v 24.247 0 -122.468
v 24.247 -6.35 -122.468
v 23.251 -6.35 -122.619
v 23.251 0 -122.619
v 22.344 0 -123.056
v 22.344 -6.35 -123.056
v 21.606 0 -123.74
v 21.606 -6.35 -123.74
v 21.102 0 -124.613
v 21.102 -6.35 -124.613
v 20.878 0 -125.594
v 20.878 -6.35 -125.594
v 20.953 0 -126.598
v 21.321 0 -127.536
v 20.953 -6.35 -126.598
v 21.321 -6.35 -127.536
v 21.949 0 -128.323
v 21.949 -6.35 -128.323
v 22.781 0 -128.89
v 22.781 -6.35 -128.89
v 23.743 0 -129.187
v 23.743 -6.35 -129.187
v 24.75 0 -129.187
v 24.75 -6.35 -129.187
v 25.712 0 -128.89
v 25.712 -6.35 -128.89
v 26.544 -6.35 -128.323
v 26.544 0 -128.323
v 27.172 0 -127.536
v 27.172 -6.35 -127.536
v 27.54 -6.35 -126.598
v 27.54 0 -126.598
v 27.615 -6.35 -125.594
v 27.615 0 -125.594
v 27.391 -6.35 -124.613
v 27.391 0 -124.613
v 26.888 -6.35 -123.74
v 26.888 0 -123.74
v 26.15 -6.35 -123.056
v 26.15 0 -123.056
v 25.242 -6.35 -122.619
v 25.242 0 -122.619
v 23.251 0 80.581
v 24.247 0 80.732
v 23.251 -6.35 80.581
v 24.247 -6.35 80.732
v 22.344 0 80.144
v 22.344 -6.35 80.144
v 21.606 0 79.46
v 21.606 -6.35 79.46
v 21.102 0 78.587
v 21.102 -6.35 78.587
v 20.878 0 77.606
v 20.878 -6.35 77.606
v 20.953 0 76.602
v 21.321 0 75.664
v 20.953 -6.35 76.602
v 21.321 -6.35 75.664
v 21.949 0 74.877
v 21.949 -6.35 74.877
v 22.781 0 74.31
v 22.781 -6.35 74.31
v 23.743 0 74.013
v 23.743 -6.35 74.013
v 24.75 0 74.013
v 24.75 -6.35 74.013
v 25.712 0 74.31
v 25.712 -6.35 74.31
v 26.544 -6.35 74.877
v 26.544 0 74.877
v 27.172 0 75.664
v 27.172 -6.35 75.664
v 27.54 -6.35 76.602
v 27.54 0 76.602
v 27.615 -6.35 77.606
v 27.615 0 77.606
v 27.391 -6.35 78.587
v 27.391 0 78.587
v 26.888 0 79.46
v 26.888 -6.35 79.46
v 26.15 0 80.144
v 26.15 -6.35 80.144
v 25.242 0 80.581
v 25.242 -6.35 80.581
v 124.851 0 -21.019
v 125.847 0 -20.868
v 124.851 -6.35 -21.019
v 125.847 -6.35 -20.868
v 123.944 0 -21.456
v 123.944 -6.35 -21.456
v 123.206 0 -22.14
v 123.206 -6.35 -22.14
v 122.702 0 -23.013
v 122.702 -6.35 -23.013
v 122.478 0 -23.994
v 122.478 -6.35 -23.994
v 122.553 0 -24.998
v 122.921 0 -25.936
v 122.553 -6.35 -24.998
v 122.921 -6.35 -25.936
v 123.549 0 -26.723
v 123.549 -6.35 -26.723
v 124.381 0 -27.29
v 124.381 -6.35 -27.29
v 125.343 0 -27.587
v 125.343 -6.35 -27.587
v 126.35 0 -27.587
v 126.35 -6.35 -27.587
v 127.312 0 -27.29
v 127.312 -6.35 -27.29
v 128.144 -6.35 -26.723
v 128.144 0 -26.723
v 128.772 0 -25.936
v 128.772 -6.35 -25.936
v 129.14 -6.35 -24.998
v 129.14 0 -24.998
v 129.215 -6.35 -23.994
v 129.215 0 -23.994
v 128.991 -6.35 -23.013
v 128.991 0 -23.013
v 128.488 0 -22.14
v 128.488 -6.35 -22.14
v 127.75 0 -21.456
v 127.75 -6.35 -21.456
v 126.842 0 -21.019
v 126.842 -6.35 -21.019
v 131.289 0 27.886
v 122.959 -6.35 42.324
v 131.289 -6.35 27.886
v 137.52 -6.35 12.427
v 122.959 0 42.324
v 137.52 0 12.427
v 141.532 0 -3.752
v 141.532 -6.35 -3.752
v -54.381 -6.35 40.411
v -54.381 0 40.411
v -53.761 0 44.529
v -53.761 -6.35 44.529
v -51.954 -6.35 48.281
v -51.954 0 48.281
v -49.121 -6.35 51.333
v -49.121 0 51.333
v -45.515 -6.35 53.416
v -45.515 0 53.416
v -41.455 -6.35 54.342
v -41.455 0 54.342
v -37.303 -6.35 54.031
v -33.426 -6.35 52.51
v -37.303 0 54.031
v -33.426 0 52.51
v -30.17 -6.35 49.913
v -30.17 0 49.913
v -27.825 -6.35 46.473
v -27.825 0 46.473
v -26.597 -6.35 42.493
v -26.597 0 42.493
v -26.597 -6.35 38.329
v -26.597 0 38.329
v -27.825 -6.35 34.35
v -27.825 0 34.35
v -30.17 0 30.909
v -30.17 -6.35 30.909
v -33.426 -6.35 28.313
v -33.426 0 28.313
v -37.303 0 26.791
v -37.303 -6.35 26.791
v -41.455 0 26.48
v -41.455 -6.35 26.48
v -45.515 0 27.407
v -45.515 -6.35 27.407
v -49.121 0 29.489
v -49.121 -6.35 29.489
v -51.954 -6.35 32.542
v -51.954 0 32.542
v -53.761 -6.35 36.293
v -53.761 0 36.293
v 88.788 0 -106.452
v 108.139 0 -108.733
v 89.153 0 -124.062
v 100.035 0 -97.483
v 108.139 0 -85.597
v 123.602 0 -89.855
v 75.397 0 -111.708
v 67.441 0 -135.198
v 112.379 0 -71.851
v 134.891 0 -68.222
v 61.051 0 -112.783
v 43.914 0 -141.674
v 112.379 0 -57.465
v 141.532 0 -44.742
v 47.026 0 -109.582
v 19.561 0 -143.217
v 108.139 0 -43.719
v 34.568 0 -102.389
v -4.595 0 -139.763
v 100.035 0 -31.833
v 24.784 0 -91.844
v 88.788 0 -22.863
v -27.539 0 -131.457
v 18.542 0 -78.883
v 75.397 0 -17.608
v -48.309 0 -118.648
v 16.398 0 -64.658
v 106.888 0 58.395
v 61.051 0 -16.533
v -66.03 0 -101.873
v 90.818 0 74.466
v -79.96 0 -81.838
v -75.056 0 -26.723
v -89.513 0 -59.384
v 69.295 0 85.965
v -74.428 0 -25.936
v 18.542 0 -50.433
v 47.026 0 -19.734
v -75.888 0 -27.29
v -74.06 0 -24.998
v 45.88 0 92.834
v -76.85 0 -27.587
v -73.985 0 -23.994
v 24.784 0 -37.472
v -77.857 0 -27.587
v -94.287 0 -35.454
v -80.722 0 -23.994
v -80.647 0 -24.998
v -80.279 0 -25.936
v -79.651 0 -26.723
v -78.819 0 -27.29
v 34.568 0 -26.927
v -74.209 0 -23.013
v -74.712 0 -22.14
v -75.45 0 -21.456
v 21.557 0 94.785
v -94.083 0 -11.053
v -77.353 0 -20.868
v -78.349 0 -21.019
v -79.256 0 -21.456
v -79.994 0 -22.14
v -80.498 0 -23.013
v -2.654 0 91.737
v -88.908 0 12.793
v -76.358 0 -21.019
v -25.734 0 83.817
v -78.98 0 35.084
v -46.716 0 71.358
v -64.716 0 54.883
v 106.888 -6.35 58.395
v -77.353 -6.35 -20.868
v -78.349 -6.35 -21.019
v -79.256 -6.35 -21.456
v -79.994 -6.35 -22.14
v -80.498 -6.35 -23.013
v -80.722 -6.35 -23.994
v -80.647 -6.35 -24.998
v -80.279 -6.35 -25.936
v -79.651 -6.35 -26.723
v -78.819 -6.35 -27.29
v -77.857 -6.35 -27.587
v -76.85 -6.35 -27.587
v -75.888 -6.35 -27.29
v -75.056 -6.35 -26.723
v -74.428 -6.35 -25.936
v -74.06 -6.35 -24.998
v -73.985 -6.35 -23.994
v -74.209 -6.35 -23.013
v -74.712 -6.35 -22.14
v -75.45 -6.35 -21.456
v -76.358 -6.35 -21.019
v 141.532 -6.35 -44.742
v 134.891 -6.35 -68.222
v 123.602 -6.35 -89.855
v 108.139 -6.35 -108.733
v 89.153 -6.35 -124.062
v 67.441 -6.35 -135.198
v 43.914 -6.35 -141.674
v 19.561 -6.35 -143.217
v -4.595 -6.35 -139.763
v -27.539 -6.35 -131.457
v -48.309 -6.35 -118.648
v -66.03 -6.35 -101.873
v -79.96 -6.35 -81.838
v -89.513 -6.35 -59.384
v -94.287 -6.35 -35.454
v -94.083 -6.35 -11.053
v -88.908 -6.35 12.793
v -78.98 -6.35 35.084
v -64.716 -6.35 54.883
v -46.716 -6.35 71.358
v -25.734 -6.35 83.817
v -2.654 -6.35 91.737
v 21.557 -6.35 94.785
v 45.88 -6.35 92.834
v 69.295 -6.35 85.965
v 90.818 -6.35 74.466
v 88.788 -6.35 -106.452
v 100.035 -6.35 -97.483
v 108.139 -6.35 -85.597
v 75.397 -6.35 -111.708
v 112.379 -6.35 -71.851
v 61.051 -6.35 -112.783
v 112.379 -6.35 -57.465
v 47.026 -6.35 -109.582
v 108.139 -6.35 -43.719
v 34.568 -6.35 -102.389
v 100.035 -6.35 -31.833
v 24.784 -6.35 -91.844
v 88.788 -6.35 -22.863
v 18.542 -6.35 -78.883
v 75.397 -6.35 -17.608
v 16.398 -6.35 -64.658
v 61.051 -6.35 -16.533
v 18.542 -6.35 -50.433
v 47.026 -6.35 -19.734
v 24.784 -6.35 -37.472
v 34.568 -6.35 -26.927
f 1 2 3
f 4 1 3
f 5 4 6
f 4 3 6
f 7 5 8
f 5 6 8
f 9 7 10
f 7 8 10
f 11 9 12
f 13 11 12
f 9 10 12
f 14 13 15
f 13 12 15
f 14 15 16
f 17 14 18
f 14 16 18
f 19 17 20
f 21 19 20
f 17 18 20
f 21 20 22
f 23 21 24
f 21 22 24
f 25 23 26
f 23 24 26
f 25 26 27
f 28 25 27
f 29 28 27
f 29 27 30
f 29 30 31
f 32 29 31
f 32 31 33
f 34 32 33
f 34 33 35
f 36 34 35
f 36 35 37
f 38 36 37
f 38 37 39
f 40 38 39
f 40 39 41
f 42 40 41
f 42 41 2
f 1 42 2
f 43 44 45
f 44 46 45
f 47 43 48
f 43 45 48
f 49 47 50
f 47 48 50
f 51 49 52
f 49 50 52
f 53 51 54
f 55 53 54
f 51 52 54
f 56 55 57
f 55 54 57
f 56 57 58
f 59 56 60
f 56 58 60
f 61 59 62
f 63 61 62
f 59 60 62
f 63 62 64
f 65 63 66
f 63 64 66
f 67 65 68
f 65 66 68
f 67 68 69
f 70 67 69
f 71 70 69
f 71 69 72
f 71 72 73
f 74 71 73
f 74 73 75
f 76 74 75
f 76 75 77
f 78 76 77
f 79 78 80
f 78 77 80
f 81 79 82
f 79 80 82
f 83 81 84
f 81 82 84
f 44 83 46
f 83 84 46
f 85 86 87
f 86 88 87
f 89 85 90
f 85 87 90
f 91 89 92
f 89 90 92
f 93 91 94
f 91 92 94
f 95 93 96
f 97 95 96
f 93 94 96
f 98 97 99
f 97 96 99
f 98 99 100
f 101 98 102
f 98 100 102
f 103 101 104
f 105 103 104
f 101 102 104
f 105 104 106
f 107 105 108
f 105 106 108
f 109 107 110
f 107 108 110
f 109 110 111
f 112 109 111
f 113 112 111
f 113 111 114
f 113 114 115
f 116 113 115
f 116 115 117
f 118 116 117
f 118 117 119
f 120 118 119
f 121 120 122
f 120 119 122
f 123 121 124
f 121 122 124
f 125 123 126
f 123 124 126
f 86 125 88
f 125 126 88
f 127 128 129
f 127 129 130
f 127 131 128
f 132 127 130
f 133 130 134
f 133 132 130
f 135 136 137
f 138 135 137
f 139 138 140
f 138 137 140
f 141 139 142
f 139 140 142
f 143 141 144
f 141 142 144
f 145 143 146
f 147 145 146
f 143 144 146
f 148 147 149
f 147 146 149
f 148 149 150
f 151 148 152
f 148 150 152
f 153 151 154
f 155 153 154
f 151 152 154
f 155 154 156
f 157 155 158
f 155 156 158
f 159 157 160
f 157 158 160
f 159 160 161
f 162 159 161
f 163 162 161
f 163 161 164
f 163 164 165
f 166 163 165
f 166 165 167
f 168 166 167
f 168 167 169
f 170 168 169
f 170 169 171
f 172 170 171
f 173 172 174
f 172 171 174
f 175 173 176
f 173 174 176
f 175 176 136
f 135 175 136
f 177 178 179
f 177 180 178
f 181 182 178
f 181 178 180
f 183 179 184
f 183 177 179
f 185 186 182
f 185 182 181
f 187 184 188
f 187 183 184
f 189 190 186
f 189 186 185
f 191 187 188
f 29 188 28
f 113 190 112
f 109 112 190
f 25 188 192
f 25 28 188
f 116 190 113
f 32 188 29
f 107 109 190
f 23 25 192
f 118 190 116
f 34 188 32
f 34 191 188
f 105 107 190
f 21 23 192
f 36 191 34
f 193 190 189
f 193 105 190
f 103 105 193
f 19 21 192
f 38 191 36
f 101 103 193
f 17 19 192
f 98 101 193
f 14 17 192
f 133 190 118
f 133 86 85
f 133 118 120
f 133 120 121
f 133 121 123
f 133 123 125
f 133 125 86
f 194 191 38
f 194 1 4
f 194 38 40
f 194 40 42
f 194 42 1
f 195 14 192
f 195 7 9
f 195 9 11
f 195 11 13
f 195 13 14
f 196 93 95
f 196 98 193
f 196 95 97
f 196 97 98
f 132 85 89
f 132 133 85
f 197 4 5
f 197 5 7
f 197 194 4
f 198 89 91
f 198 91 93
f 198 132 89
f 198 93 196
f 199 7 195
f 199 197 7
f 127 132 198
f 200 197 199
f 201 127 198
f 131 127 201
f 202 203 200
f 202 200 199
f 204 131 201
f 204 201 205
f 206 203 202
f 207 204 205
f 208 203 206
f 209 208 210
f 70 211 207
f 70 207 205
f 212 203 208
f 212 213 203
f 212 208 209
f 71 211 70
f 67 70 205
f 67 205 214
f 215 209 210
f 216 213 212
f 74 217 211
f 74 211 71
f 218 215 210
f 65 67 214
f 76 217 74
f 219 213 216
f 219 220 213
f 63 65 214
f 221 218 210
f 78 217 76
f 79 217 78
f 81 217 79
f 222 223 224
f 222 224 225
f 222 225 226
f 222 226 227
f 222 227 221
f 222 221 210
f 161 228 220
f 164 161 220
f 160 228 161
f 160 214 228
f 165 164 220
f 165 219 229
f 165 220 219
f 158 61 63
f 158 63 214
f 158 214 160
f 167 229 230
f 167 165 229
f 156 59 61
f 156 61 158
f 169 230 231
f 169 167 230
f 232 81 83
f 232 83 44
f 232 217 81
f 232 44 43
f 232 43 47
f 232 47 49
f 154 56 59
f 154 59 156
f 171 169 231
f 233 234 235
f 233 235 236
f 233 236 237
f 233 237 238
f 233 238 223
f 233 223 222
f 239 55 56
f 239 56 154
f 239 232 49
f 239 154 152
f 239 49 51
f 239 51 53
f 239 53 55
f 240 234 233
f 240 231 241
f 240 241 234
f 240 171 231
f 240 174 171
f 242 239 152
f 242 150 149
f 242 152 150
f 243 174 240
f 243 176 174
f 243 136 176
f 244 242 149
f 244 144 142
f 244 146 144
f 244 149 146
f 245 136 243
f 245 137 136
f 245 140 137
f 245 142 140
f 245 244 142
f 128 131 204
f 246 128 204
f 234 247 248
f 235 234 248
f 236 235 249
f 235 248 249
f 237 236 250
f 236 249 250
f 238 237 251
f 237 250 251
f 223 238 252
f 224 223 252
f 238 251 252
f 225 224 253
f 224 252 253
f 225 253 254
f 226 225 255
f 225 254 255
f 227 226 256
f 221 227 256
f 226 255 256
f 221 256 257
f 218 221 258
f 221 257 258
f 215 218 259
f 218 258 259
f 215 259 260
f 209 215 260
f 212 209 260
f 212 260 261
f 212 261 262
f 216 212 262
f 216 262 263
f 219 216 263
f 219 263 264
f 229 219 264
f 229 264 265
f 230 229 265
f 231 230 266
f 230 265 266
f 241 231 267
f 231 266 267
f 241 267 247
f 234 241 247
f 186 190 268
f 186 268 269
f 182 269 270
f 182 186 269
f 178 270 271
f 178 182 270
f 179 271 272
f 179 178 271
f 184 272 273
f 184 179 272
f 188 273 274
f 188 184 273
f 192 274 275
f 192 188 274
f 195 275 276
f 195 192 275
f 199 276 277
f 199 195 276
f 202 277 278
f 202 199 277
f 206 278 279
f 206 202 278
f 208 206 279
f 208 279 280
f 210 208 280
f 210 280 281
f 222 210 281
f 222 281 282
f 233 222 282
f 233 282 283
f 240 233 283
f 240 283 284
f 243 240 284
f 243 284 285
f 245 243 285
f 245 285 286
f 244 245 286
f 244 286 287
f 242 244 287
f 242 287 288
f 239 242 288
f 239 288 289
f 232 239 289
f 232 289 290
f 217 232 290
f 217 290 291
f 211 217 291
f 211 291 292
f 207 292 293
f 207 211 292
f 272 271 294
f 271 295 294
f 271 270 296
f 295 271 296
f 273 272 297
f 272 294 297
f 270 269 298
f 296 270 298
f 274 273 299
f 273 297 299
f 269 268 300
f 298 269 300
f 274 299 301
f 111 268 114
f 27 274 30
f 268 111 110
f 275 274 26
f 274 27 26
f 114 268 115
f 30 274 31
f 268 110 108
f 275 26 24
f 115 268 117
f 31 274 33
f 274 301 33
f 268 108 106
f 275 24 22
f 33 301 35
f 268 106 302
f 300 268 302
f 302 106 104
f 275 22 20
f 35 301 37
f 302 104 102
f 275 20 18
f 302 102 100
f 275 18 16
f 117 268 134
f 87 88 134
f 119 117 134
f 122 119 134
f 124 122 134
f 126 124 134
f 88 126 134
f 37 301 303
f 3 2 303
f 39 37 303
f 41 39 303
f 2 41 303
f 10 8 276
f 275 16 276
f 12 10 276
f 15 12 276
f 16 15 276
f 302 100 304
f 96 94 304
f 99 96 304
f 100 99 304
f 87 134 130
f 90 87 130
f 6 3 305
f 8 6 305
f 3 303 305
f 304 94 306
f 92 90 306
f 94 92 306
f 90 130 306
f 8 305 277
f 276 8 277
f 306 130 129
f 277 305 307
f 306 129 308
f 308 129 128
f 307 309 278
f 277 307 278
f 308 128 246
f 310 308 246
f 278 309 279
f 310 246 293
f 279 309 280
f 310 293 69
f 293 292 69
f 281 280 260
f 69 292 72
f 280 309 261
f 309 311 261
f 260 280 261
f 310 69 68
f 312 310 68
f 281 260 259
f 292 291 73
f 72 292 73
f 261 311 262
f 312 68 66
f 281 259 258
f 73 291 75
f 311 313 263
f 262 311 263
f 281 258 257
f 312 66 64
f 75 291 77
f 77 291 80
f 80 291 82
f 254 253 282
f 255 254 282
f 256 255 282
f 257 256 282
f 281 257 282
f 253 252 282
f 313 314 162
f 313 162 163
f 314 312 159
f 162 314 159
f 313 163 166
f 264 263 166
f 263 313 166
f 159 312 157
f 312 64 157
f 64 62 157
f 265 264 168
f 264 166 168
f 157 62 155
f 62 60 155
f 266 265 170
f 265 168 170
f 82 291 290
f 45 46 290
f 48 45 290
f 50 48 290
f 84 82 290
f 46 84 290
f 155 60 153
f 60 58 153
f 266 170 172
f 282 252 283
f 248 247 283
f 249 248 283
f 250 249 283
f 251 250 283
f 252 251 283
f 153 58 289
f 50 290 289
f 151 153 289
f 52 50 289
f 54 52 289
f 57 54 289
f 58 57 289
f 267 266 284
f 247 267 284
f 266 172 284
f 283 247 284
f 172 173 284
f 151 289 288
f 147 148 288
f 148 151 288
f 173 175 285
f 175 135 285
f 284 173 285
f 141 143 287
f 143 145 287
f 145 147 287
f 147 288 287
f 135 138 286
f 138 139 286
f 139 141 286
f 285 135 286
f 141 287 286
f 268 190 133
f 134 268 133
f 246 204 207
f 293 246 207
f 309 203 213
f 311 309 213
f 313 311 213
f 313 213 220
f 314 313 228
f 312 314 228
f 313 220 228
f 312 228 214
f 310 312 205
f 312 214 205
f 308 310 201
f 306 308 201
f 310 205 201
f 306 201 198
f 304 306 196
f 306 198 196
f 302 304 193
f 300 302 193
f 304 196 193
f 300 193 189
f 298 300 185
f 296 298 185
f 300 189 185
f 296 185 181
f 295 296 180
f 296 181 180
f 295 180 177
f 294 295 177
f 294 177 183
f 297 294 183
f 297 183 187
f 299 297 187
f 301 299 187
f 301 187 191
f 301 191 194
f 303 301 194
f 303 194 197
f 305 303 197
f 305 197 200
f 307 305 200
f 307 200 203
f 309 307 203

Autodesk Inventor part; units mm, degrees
ref_plane "YZ Plane" through (0, 0, 0) normal (1, 0, 0) x (0, 1, 0)
ref_plane "XZ Plane" through (0, 0, 0) normal (0, 1, 0) x (-1, 0, 0)
ref_plane "XY Plane" through (0, 0, 0) normal (0, 0, 1) x (1, 0, 0)
sketch "Sketch2" plane through (0, 0, 0) normal (0, 1, 0) x (-1, 0, 0)
  line L0 (0, 0) -> (-24.2467, -24.2467) construction
  line L1 (0, 0) -> (-34.29, 0) construction
  circle A0 centre (-24.2467, -24.2467) radius 119.0625
  dimension "d6" = 34.29
  dimension "d7" = 315
  dimension "d8" = 238.125
extrude "Extrusion1" add sketch "Sketch2" against normal blind 6.35
sketch "Sketch1" plane through (0, 0, 0) normal (0, 1, 0) x (-1, 0, 0)
  line L0 (0, 0) -> (-64.6578, -64.6578) construction
  line L1 (0, 0) -> (91.44, 0) construction
  circle A0 centre (-64.6578, -64.6578) radius 48.26
  line L2 (0, 0) -> (40.4112, 40.4112) construction
  line L3 (0, 0) -> (57.15, 0) construction
  circle A1 centre (40.4112, 40.4112) radius 13.97
  dimension "d0" = 91.44
  dimension "d1" = 135
  dimension "d2" = 96.52
  dimension "d3" = 57.15
  dimension "d4" = 45
  dimension "d5" = 27.94
extrude "Extrusion2" cut sketch "Sketch1" against normal up to surface (6.35 mm away)
sketch "Sketch9" plane through (24.2467, 0, -24.2467) normal (0, 1, 0) x (1, 0, 0)
  circle A0 centre (40.4112, 40.4112) radius 48.26 projected
  circle A1 centre (-64.6578, -64.6578) radius 13.97 projected
  line L0 (40.4112, 40.4112) -> (-64.6578, -64.6578)
  circle A2 centre (-29.6348, -29.6348) radius 63.5
  circle A3 centre (29.6348, 29.6348) radius 63.5
  circle A4 centre (40.4112, 40.4112) radius 48.26 projected
  line L1 (-33.7328, 33.7328) -> (33.7328, -33.7328)
  point P0 (-24.2467, -24.2467)
  dimension "d81" = 127
  dimension "d82" = 127
sketch "Sketch10" plane through (24.2467, 0, -24.2467) normal (0, 1, 0) x (1, 0, 0)
  circle A0 centre (0, 0) radius 119.0625 projected
  circle A1 centre (0, 0) radius 101.6 construction
  line L0 (0, 0) -> (0, 101.6) construction
  line L1 (0, 0) -> (-101.6, 0) construction
  line L2 (0, 0) -> (0, -101.6) construction
  line L3 (0, 0) -> (101.6, 0) construction
  point P0 (-24.2467, -24.2467)
  dimension "d83" = 203.2
  dimension "d86" = 360
hole "Hole4" at (-77.3533, 0, -24.2467) at (125.8467, 0, -24.2467) at (24.2467, 0, 77.3533) at (24.2467, 0, -125.8467) direction (0, -1, 0) diameter 6.7564 end through all clearance for "Flat Head Machine Screw (82)" size "1/4" standard "Ansi Unified Screw Threads"
sketch "Sketch11" plane through (24.2467, 0, -24.2467) normal (0, 1, 0) x (1, 0, 0)
  line L0 (117.2853, -50.0358) -> (124.9604, -50.0358)
  line L1 (124.9604, -50.0358) -> (124.9604, 67.1373)
  line L2 (124.9604, 67.1373) -> (117.2853, 67.1373)
  line L3 (117.2853, 67.1373) -> (117.2853, -50.0358)
  line L4 (0, 0) -> (82.6418, -82.6418)
  line L5 (0, 0) -> (116.8732, 0) construction
  line L6 (82.6418, -82.6418) -> (56.0171, -109.2666)
  line L7 (56.0171, -109.2666) -> (65.8131, -119.0625)
  line L8 (65.8131, -119.0625) -> (121.1228, -63.7527)
  line L9 (121.1228, -63.7527) -> (111.3269, -53.9568)
  line L10 (111.3269, -53.9568) -> (82.6418, -82.6418)
  point P0 (-24.2467, -24.2467)
  dimension "d95" = 45
extrude "Extrusion3" cut sketch "Sketch11" against normal blind 44.45
properties part number "2K8 stage mini" material "Copper"
